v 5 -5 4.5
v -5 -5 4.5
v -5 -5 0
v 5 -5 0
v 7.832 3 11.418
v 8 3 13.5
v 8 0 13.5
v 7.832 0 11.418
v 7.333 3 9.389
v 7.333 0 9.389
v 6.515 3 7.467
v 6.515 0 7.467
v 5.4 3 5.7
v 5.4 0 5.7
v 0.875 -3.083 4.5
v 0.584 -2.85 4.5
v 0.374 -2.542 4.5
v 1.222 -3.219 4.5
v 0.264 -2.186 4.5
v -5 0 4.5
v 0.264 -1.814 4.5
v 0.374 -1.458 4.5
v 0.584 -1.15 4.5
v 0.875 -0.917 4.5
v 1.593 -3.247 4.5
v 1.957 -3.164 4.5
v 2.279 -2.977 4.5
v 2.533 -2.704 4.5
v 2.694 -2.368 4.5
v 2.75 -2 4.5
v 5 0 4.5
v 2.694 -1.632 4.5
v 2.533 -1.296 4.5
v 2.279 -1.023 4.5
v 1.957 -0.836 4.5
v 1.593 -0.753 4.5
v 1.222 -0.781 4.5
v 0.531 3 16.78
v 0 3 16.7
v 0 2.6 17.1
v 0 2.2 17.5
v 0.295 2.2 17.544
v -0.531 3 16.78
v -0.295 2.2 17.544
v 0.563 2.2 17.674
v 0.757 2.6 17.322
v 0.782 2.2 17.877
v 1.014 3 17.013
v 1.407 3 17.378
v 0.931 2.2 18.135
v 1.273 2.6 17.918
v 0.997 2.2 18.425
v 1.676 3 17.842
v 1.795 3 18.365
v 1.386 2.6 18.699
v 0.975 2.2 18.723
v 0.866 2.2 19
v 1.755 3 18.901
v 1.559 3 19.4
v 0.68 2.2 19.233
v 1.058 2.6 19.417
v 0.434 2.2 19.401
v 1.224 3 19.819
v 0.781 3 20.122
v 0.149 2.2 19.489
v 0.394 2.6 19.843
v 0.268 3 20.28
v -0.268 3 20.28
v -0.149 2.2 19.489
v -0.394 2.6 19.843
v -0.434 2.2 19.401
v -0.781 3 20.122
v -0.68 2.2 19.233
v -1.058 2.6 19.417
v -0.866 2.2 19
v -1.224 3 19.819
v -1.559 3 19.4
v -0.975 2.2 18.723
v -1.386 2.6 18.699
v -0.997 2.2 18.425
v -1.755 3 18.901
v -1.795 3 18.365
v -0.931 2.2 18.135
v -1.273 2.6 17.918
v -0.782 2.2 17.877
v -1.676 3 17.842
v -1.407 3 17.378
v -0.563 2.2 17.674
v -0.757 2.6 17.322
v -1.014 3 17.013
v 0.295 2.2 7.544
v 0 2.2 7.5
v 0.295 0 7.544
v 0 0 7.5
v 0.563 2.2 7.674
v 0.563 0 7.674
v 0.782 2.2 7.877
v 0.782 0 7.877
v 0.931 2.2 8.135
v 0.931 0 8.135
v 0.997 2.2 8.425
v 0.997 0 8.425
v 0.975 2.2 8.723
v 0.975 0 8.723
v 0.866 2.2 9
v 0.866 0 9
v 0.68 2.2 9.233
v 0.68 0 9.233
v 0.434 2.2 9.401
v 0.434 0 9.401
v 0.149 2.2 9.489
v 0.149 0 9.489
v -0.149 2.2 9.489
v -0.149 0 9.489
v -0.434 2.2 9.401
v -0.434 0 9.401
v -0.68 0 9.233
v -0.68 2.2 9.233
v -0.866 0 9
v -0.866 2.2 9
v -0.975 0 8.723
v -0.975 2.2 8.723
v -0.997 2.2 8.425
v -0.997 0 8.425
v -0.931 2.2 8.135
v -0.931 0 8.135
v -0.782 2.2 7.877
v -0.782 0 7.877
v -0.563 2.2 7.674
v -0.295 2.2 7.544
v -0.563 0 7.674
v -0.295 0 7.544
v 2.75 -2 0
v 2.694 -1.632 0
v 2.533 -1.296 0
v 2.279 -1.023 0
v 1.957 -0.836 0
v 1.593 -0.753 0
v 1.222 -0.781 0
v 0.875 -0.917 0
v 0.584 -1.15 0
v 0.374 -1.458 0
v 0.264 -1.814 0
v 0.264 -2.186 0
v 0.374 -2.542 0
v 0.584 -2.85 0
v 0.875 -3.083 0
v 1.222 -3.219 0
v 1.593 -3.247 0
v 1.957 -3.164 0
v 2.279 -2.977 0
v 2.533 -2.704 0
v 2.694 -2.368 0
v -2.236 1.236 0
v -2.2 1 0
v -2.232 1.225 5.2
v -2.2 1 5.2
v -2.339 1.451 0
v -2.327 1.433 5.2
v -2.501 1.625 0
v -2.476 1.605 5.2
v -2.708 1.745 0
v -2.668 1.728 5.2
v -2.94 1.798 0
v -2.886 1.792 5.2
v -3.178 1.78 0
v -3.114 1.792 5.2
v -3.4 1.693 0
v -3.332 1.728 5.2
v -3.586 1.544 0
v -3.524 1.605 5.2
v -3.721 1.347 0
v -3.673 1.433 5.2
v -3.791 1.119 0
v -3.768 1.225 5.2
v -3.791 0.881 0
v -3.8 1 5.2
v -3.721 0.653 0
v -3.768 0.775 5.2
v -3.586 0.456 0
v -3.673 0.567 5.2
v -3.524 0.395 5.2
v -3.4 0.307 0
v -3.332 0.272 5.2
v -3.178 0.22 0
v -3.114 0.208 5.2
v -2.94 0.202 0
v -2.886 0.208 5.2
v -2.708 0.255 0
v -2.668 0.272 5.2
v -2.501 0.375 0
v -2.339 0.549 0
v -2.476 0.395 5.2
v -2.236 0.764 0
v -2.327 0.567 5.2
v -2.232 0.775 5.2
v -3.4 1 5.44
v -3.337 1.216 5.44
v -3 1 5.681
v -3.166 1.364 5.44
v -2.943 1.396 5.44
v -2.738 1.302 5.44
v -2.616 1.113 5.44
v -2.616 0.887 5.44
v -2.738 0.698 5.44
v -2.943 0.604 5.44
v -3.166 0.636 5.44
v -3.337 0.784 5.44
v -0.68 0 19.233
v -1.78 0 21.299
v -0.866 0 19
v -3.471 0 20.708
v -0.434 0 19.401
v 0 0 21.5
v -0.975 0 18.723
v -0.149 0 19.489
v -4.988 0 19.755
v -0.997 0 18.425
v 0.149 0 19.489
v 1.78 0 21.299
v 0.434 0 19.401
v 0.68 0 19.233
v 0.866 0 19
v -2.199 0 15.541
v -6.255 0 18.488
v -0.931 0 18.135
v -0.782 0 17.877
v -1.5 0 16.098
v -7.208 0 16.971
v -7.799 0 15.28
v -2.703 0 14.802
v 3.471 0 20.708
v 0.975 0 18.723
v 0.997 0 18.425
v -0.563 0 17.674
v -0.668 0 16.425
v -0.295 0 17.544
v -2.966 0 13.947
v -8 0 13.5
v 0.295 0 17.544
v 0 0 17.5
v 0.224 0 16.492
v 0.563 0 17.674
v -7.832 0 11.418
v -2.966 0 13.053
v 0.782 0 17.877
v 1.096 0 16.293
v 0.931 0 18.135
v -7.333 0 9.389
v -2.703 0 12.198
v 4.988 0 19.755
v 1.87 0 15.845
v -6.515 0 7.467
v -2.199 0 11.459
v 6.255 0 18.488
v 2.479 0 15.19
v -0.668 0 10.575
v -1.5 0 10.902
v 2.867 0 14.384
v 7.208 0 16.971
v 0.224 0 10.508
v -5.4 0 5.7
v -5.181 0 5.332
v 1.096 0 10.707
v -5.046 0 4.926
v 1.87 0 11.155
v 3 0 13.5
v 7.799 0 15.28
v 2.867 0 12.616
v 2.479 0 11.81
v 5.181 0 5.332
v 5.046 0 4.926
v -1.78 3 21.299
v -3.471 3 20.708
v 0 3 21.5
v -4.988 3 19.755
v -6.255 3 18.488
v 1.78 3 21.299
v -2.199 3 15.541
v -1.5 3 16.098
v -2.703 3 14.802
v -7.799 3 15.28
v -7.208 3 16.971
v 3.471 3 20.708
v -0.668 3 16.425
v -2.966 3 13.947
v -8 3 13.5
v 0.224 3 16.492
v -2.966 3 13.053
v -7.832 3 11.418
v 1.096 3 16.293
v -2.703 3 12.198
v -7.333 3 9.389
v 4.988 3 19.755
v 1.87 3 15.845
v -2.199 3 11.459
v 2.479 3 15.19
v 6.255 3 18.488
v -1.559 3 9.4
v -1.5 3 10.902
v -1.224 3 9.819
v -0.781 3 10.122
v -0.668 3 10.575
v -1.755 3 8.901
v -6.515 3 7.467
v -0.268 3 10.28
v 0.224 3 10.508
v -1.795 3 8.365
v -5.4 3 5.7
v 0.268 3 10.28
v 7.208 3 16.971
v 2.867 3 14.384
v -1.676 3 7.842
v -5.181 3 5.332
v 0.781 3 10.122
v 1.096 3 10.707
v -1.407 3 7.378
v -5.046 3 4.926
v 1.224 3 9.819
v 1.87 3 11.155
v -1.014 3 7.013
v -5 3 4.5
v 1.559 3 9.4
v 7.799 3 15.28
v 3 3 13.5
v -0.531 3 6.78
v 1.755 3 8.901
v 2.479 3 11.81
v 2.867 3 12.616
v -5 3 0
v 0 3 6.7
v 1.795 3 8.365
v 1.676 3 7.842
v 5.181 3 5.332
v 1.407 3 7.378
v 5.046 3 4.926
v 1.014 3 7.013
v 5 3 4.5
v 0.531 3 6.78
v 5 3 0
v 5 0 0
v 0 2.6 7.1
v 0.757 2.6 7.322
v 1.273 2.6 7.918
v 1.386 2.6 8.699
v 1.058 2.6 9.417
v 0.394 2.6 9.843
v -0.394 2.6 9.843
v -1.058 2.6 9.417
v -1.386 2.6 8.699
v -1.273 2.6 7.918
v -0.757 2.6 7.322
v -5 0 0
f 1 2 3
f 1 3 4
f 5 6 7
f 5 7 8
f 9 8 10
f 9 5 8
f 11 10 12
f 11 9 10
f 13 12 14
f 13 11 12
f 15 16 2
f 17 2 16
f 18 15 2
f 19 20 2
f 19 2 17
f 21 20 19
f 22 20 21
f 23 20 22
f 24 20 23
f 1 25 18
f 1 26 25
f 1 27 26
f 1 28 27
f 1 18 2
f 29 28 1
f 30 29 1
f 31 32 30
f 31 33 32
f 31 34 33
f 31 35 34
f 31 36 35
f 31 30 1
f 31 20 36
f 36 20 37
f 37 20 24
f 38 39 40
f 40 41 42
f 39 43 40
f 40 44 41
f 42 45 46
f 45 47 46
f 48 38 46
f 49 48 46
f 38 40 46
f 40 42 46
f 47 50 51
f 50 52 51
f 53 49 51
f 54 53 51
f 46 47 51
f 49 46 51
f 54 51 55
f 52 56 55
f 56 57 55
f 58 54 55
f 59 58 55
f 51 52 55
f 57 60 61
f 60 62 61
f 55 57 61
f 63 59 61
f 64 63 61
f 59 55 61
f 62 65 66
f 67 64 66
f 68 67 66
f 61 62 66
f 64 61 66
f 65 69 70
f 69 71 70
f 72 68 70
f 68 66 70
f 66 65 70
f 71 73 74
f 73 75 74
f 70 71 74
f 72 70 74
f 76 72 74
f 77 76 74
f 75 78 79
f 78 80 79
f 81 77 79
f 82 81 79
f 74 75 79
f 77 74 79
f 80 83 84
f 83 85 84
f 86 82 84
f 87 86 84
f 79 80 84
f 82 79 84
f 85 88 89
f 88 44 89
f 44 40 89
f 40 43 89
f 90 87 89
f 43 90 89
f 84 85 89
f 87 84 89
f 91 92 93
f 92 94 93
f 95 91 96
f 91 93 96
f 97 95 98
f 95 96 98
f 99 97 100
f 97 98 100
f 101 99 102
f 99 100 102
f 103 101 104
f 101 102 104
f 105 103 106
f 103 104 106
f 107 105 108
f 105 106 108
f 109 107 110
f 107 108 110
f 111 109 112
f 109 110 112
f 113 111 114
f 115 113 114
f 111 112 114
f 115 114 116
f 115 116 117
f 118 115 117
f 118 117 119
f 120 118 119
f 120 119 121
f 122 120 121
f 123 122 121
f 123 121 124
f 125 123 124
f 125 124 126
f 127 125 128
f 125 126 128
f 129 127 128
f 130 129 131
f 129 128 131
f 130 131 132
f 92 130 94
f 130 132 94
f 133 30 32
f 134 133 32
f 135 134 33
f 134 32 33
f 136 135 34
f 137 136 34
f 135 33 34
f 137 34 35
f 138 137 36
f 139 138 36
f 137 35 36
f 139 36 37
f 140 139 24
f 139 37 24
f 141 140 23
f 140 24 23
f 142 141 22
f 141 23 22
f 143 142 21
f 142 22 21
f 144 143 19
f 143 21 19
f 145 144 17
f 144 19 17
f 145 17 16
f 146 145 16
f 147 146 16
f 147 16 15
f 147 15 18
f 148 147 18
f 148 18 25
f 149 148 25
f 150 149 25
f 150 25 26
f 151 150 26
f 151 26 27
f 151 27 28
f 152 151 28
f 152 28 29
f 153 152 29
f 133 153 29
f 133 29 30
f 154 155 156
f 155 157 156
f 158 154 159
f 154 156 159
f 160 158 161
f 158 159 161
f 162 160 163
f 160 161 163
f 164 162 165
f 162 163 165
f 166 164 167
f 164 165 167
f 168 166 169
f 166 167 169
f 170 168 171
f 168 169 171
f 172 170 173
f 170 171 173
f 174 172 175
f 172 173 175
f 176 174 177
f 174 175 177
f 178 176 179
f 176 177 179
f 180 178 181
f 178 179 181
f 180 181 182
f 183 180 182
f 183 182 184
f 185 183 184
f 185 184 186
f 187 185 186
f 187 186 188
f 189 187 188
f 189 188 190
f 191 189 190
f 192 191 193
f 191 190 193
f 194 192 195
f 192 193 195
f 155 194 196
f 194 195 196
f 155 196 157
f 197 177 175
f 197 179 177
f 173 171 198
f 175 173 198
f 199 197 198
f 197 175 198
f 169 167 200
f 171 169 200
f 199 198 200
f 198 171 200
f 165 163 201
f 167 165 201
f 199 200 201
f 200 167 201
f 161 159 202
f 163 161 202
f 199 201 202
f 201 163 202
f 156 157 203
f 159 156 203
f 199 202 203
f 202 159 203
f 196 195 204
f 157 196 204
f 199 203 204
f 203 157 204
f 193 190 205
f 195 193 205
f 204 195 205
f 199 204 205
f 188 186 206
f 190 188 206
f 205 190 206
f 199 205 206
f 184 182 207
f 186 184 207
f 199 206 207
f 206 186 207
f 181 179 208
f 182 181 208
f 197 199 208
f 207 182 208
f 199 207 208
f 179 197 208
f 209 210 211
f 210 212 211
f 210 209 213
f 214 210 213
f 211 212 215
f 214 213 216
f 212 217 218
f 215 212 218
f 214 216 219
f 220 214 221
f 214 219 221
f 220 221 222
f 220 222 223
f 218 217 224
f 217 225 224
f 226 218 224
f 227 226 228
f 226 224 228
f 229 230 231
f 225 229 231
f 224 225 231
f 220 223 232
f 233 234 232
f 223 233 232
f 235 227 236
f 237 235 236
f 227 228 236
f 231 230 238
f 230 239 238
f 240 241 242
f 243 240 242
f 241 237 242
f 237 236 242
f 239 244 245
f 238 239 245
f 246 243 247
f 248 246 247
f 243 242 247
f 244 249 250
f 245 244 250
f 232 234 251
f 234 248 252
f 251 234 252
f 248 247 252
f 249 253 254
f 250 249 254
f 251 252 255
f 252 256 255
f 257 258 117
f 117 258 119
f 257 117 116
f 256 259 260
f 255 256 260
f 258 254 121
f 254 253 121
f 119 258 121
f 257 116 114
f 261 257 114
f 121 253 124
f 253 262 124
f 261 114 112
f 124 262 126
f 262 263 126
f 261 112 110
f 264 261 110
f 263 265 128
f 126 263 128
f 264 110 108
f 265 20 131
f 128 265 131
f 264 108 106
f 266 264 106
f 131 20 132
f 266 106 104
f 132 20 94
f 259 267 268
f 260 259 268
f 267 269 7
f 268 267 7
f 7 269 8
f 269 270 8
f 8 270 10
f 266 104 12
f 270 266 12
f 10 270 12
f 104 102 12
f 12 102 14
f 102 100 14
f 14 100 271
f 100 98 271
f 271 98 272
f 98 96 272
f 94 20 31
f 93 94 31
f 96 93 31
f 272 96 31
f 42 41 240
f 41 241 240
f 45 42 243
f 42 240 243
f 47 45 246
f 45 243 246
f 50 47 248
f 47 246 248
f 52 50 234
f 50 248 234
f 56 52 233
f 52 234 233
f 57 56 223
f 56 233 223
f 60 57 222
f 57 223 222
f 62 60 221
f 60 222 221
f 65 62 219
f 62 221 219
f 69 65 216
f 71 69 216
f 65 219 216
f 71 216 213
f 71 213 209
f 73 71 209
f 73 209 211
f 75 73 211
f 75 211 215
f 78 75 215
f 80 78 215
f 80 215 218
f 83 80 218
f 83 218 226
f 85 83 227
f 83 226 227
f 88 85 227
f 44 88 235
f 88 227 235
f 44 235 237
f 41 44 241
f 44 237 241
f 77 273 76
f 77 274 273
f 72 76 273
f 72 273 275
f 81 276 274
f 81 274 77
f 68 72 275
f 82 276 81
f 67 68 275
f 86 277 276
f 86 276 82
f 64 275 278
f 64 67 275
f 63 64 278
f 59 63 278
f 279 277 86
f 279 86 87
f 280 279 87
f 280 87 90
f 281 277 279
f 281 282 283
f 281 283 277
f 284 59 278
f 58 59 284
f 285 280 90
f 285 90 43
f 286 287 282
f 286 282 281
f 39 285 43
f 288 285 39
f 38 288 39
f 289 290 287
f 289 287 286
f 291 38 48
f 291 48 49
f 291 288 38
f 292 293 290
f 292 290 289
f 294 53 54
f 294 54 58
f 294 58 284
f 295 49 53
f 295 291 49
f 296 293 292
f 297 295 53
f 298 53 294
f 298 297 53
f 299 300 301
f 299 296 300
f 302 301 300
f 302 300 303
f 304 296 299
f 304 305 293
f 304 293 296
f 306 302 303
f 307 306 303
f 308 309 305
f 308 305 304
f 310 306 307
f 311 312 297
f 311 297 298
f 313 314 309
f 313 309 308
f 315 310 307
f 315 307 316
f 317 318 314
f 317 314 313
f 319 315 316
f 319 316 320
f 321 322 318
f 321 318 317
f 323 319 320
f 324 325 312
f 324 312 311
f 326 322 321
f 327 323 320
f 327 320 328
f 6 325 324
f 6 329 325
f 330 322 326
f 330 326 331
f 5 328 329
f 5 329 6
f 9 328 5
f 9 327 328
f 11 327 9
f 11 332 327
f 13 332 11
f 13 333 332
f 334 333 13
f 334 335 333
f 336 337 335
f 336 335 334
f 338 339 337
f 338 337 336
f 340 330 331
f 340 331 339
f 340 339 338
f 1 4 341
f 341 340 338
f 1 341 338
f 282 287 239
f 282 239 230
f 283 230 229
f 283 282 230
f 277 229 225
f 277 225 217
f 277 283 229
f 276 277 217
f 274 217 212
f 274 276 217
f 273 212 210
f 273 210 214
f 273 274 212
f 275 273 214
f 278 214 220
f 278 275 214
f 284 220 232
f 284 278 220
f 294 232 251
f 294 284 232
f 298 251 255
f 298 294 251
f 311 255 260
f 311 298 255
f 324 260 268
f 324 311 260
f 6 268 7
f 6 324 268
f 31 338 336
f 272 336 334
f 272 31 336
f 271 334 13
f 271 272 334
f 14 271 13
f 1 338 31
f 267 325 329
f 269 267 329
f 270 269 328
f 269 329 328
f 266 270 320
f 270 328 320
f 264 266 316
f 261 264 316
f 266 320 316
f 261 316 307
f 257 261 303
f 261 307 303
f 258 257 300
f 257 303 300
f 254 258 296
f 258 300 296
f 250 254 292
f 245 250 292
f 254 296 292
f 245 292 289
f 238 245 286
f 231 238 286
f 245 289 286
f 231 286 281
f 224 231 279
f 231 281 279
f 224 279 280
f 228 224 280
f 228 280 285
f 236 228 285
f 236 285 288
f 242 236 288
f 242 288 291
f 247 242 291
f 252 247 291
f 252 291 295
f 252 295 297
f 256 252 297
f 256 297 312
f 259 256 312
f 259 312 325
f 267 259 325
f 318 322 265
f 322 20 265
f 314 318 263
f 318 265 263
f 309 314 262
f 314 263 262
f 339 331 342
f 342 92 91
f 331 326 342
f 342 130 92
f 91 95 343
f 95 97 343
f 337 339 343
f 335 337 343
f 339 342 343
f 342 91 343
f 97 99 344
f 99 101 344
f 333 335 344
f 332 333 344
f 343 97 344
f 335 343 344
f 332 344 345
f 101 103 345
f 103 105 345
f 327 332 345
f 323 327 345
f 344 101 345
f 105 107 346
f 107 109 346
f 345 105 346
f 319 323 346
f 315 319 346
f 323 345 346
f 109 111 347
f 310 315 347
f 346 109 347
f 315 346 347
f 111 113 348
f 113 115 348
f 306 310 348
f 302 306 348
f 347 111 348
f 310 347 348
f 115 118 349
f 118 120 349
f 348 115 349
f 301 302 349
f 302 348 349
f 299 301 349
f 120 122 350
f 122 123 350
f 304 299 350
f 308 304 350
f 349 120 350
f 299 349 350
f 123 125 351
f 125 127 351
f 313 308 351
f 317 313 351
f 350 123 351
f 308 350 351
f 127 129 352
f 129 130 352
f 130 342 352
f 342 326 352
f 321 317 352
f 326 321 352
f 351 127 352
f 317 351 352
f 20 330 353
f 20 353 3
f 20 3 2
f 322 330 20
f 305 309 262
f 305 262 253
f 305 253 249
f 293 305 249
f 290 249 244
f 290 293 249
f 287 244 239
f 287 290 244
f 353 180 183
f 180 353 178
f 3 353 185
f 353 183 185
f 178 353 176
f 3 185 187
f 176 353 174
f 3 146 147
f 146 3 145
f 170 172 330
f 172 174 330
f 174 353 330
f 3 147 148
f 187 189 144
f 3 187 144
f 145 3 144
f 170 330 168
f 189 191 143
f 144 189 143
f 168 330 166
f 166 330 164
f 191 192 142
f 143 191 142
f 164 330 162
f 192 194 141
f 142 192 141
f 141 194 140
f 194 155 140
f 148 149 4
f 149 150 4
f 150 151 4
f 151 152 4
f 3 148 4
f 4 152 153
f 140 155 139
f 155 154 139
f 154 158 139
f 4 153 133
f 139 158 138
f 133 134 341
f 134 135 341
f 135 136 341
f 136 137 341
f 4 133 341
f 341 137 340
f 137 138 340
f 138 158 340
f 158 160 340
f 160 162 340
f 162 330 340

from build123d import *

# Parameters (mm, degrees)
BOSS_EXTRUDE1_DEPTH           = 3
SKETCH2_W                     = 10
SKETCH2_H                     = 4.5
BOSS_EXTRUDE2_DEPTH           = 5
F_6_0_6_DIAMETER_HOLE1_D      = 6
M3X0_5_TAPPED_HOLE1_D         = 2.5
M2X0_4_TAPPED_HOLE1_D         = 1.6
M2X0_4_TAPPED_HOLE1_DEPTH     = 5.2
M2X0_4_TAPPED_HOLE1_TIP       = 0.480688495
FILLET1_R                     = 2
CSK_FOR_M3_SFHCS3_D           = 2
CSK_FOR_M3_SFHCS3_DEPTH       = 9.5
CSK_FOR_M3_SFHCS3_CSINK_D     = 3.6
CSK_FOR_M3_SFHCS3_CSINK_ANGLE = 90
CSK_FOR_M3_SFHCS3_TIP         = 0.600860619


with BuildPart() as part:
    # Sketch1 → Boss-Extrude1 (new body)
    with BuildSketch(Plane(origin=(0, 3, 0), x_dir=(1, 0, 0), z_dir=(0, 1, 0))):
        with BuildLine():
            Line((5.000000003, -5.193376137), (5.000000003, 0))
            Line((5.000000003, 0), (-4.999999997, 0))
            Line((-4.999999997, 0), (-4.999999997, -5.193376137))
            ThreePointArc((-4.999999997, -5.193376137), (-7.227019257, -9.084119567), (-7.999999997, -13.5))
            ThreePointArc((-7.999999997, -13.5), (3e-09, -21.5), (8.000000003, -13.5))
            ThreePointArc((8.000000003, -13.5), (7.227019264, -9.084119567), (5.000000003, -5.193376137))
        make_face()
    extrude(amount=-BOSS_EXTRUDE1_DEPTH)

    # Sketch2 → Boss-Extrude2 (add)
    with BuildSketch(Plane.XZ):
        with Locations((0, 2.25)):
            Rectangle(SKETCH2_W, SKETCH2_H)
    extrude(amount=BOSS_EXTRUDE2_DEPTH)

    # Ø6.0 (6) Diameter Hole1 (through all)
    with Locations(Plane(origin=(0, 0, 0), x_dir=(-1, 0, 0), z_dir=(0, -1, 0))):
        with Locations((0, -13.5)):
            Hole(F_6_0_6_DIAMETER_HOLE1_D / 2)

    # M3x0.5 Tapped Hole1 (through all)
    with Locations(Plane(origin=(0, 0, 0), x_dir=(-1, 0, 0), z_dir=(0, 0, -1))):
        with Locations((-1.5, -2)):
            Hole(M3X0_5_TAPPED_HOLE1_D / 2)

    # M2x0.4 Tapped Hole1
    with Locations(Plane(origin=(0, 0, 0), x_dir=(-1, 0, 0), z_dir=(0, 0, -1))):
        with Locations((3, 1)):
            Hole(M2X0_4_TAPPED_HOLE1_D / 2, depth=M2X0_4_TAPPED_HOLE1_DEPTH)
            with Locations((0, 0, -(M2X0_4_TAPPED_HOLE1_DEPTH + M2X0_4_TAPPED_HOLE1_TIP / 2))):  # 118° drill point
                Cone(0, M2X0_4_TAPPED_HOLE1_D / 2, M2X0_4_TAPPED_HOLE1_TIP, mode=Mode.SUBTRACT)

    # Fillet1
    fillet1_edges = [part.edges().sort_by_distance(p)[0] for p in [
        (5.000000003, 1.5, 5.193376137),
        (-4.999999997, 1.5, 5.193376137),
    ]]
    fillet(fillet1_edges, radius=FILLET1_R)

    # CSK for M3 SFHCS3
    with Locations(Plane(origin=(3e-09, 3, 8.5), x_dir=(0, 0, 1), z_dir=(0, 1, 0))):
        with Locations((0, 0), (10, 0)):
            CounterSinkHole(CSK_FOR_M3_SFHCS3_D / 2, CSK_FOR_M3_SFHCS3_CSINK_D / 2, depth=CSK_FOR_M3_SFHCS3_DEPTH, counter_sink_angle=CSK_FOR_M3_SFHCS3_CSINK_ANGLE)
            with Locations((0, 0, -(CSK_FOR_M3_SFHCS3_DEPTH + CSK_FOR_M3_SFHCS3_TIP / 2))):  # 118° drill point
                Cone(0, CSK_FOR_M3_SFHCS3_D / 2, CSK_FOR_M3_SFHCS3_TIP, mode=Mode.SUBTRACT)


solid = part.part
